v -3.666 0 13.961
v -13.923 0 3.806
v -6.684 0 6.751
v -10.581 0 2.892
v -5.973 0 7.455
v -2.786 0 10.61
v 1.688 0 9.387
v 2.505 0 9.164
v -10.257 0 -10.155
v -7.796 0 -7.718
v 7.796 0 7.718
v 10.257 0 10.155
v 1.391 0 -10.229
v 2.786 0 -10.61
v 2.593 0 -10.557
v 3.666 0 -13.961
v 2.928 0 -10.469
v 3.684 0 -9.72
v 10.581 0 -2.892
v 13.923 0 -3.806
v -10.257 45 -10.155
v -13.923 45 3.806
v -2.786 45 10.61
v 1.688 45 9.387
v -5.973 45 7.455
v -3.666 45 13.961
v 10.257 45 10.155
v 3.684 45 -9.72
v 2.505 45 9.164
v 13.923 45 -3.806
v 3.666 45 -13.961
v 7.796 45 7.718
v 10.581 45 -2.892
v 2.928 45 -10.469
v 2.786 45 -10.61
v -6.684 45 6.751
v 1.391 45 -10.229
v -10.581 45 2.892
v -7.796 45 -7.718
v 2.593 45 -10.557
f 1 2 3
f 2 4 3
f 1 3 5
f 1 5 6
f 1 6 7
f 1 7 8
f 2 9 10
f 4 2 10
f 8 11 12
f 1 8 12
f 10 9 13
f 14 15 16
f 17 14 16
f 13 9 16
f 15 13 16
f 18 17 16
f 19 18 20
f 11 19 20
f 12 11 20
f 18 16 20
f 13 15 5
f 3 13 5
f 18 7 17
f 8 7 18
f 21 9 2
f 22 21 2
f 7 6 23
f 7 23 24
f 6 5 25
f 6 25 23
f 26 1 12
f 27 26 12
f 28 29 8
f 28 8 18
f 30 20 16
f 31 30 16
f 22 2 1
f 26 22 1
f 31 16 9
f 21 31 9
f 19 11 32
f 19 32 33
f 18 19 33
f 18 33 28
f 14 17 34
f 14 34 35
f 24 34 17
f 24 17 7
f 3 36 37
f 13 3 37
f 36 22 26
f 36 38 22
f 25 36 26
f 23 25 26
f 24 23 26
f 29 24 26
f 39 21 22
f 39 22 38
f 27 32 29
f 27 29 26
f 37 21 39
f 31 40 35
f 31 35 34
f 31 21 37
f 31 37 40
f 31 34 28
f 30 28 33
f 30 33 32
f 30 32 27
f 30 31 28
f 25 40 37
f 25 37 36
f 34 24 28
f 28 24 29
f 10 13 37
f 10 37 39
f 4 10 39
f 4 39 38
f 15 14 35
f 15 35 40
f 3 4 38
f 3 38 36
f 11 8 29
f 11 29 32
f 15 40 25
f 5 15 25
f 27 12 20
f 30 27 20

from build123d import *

# Parameters (mm, degrees)
BOSS_EXTRUDE1_DEPTH = 45
BOSS_EXTRUDE2_DEPTH = 45


with BuildPart() as part:
    # Sketch1 → Boss-Extrude1 (new body)
    with BuildSketch(Plane(origin=(0, 0, 0), x_dir=(1, 0, 0), z_dir=(0, 1, 0))):
        Polygon((10.257365227, -10.154791575), (13.922990088, 3.805743075), (3.66562486, 13.96053465), (-10.257365227, 10.154791575), (-13.922990088, -3.805743075), (-3.66562486, -13.96053465), align=None)
        Polygon((-2.785874894, -10.610006334), (7.795597573, -7.717641597), (10.581472467, 2.892364737), (2.785874894, 10.610006334), (-7.795597573, 7.717641597), (-10.581472467, -2.892364737), align=None, mode=Mode.SUBTRACT)
    extrude(amount=BOSS_EXTRUDE1_DEPTH)

    # Sketch2 → Boss-Extrude2 (add)
    with BuildSketch(Plane(origin=(0, 45, 0), x_dir=(1, 0, 0), z_dir=(0, 1, 0))):
        Polygon((-6.68367368, -6.751185536), (1.391190433, 10.228779981), (2.592952284, 10.557272411), (-5.972802955, -7.454947554), align=None)
        Polygon((2.504861339, -9.163823965), (3.684441387, 9.720425506), (2.928005116, 10.469297414), (1.68769549, -9.387190014), align=None)
    extrude(amount=-BOSS_EXTRUDE2_DEPTH)


solid = part.part
